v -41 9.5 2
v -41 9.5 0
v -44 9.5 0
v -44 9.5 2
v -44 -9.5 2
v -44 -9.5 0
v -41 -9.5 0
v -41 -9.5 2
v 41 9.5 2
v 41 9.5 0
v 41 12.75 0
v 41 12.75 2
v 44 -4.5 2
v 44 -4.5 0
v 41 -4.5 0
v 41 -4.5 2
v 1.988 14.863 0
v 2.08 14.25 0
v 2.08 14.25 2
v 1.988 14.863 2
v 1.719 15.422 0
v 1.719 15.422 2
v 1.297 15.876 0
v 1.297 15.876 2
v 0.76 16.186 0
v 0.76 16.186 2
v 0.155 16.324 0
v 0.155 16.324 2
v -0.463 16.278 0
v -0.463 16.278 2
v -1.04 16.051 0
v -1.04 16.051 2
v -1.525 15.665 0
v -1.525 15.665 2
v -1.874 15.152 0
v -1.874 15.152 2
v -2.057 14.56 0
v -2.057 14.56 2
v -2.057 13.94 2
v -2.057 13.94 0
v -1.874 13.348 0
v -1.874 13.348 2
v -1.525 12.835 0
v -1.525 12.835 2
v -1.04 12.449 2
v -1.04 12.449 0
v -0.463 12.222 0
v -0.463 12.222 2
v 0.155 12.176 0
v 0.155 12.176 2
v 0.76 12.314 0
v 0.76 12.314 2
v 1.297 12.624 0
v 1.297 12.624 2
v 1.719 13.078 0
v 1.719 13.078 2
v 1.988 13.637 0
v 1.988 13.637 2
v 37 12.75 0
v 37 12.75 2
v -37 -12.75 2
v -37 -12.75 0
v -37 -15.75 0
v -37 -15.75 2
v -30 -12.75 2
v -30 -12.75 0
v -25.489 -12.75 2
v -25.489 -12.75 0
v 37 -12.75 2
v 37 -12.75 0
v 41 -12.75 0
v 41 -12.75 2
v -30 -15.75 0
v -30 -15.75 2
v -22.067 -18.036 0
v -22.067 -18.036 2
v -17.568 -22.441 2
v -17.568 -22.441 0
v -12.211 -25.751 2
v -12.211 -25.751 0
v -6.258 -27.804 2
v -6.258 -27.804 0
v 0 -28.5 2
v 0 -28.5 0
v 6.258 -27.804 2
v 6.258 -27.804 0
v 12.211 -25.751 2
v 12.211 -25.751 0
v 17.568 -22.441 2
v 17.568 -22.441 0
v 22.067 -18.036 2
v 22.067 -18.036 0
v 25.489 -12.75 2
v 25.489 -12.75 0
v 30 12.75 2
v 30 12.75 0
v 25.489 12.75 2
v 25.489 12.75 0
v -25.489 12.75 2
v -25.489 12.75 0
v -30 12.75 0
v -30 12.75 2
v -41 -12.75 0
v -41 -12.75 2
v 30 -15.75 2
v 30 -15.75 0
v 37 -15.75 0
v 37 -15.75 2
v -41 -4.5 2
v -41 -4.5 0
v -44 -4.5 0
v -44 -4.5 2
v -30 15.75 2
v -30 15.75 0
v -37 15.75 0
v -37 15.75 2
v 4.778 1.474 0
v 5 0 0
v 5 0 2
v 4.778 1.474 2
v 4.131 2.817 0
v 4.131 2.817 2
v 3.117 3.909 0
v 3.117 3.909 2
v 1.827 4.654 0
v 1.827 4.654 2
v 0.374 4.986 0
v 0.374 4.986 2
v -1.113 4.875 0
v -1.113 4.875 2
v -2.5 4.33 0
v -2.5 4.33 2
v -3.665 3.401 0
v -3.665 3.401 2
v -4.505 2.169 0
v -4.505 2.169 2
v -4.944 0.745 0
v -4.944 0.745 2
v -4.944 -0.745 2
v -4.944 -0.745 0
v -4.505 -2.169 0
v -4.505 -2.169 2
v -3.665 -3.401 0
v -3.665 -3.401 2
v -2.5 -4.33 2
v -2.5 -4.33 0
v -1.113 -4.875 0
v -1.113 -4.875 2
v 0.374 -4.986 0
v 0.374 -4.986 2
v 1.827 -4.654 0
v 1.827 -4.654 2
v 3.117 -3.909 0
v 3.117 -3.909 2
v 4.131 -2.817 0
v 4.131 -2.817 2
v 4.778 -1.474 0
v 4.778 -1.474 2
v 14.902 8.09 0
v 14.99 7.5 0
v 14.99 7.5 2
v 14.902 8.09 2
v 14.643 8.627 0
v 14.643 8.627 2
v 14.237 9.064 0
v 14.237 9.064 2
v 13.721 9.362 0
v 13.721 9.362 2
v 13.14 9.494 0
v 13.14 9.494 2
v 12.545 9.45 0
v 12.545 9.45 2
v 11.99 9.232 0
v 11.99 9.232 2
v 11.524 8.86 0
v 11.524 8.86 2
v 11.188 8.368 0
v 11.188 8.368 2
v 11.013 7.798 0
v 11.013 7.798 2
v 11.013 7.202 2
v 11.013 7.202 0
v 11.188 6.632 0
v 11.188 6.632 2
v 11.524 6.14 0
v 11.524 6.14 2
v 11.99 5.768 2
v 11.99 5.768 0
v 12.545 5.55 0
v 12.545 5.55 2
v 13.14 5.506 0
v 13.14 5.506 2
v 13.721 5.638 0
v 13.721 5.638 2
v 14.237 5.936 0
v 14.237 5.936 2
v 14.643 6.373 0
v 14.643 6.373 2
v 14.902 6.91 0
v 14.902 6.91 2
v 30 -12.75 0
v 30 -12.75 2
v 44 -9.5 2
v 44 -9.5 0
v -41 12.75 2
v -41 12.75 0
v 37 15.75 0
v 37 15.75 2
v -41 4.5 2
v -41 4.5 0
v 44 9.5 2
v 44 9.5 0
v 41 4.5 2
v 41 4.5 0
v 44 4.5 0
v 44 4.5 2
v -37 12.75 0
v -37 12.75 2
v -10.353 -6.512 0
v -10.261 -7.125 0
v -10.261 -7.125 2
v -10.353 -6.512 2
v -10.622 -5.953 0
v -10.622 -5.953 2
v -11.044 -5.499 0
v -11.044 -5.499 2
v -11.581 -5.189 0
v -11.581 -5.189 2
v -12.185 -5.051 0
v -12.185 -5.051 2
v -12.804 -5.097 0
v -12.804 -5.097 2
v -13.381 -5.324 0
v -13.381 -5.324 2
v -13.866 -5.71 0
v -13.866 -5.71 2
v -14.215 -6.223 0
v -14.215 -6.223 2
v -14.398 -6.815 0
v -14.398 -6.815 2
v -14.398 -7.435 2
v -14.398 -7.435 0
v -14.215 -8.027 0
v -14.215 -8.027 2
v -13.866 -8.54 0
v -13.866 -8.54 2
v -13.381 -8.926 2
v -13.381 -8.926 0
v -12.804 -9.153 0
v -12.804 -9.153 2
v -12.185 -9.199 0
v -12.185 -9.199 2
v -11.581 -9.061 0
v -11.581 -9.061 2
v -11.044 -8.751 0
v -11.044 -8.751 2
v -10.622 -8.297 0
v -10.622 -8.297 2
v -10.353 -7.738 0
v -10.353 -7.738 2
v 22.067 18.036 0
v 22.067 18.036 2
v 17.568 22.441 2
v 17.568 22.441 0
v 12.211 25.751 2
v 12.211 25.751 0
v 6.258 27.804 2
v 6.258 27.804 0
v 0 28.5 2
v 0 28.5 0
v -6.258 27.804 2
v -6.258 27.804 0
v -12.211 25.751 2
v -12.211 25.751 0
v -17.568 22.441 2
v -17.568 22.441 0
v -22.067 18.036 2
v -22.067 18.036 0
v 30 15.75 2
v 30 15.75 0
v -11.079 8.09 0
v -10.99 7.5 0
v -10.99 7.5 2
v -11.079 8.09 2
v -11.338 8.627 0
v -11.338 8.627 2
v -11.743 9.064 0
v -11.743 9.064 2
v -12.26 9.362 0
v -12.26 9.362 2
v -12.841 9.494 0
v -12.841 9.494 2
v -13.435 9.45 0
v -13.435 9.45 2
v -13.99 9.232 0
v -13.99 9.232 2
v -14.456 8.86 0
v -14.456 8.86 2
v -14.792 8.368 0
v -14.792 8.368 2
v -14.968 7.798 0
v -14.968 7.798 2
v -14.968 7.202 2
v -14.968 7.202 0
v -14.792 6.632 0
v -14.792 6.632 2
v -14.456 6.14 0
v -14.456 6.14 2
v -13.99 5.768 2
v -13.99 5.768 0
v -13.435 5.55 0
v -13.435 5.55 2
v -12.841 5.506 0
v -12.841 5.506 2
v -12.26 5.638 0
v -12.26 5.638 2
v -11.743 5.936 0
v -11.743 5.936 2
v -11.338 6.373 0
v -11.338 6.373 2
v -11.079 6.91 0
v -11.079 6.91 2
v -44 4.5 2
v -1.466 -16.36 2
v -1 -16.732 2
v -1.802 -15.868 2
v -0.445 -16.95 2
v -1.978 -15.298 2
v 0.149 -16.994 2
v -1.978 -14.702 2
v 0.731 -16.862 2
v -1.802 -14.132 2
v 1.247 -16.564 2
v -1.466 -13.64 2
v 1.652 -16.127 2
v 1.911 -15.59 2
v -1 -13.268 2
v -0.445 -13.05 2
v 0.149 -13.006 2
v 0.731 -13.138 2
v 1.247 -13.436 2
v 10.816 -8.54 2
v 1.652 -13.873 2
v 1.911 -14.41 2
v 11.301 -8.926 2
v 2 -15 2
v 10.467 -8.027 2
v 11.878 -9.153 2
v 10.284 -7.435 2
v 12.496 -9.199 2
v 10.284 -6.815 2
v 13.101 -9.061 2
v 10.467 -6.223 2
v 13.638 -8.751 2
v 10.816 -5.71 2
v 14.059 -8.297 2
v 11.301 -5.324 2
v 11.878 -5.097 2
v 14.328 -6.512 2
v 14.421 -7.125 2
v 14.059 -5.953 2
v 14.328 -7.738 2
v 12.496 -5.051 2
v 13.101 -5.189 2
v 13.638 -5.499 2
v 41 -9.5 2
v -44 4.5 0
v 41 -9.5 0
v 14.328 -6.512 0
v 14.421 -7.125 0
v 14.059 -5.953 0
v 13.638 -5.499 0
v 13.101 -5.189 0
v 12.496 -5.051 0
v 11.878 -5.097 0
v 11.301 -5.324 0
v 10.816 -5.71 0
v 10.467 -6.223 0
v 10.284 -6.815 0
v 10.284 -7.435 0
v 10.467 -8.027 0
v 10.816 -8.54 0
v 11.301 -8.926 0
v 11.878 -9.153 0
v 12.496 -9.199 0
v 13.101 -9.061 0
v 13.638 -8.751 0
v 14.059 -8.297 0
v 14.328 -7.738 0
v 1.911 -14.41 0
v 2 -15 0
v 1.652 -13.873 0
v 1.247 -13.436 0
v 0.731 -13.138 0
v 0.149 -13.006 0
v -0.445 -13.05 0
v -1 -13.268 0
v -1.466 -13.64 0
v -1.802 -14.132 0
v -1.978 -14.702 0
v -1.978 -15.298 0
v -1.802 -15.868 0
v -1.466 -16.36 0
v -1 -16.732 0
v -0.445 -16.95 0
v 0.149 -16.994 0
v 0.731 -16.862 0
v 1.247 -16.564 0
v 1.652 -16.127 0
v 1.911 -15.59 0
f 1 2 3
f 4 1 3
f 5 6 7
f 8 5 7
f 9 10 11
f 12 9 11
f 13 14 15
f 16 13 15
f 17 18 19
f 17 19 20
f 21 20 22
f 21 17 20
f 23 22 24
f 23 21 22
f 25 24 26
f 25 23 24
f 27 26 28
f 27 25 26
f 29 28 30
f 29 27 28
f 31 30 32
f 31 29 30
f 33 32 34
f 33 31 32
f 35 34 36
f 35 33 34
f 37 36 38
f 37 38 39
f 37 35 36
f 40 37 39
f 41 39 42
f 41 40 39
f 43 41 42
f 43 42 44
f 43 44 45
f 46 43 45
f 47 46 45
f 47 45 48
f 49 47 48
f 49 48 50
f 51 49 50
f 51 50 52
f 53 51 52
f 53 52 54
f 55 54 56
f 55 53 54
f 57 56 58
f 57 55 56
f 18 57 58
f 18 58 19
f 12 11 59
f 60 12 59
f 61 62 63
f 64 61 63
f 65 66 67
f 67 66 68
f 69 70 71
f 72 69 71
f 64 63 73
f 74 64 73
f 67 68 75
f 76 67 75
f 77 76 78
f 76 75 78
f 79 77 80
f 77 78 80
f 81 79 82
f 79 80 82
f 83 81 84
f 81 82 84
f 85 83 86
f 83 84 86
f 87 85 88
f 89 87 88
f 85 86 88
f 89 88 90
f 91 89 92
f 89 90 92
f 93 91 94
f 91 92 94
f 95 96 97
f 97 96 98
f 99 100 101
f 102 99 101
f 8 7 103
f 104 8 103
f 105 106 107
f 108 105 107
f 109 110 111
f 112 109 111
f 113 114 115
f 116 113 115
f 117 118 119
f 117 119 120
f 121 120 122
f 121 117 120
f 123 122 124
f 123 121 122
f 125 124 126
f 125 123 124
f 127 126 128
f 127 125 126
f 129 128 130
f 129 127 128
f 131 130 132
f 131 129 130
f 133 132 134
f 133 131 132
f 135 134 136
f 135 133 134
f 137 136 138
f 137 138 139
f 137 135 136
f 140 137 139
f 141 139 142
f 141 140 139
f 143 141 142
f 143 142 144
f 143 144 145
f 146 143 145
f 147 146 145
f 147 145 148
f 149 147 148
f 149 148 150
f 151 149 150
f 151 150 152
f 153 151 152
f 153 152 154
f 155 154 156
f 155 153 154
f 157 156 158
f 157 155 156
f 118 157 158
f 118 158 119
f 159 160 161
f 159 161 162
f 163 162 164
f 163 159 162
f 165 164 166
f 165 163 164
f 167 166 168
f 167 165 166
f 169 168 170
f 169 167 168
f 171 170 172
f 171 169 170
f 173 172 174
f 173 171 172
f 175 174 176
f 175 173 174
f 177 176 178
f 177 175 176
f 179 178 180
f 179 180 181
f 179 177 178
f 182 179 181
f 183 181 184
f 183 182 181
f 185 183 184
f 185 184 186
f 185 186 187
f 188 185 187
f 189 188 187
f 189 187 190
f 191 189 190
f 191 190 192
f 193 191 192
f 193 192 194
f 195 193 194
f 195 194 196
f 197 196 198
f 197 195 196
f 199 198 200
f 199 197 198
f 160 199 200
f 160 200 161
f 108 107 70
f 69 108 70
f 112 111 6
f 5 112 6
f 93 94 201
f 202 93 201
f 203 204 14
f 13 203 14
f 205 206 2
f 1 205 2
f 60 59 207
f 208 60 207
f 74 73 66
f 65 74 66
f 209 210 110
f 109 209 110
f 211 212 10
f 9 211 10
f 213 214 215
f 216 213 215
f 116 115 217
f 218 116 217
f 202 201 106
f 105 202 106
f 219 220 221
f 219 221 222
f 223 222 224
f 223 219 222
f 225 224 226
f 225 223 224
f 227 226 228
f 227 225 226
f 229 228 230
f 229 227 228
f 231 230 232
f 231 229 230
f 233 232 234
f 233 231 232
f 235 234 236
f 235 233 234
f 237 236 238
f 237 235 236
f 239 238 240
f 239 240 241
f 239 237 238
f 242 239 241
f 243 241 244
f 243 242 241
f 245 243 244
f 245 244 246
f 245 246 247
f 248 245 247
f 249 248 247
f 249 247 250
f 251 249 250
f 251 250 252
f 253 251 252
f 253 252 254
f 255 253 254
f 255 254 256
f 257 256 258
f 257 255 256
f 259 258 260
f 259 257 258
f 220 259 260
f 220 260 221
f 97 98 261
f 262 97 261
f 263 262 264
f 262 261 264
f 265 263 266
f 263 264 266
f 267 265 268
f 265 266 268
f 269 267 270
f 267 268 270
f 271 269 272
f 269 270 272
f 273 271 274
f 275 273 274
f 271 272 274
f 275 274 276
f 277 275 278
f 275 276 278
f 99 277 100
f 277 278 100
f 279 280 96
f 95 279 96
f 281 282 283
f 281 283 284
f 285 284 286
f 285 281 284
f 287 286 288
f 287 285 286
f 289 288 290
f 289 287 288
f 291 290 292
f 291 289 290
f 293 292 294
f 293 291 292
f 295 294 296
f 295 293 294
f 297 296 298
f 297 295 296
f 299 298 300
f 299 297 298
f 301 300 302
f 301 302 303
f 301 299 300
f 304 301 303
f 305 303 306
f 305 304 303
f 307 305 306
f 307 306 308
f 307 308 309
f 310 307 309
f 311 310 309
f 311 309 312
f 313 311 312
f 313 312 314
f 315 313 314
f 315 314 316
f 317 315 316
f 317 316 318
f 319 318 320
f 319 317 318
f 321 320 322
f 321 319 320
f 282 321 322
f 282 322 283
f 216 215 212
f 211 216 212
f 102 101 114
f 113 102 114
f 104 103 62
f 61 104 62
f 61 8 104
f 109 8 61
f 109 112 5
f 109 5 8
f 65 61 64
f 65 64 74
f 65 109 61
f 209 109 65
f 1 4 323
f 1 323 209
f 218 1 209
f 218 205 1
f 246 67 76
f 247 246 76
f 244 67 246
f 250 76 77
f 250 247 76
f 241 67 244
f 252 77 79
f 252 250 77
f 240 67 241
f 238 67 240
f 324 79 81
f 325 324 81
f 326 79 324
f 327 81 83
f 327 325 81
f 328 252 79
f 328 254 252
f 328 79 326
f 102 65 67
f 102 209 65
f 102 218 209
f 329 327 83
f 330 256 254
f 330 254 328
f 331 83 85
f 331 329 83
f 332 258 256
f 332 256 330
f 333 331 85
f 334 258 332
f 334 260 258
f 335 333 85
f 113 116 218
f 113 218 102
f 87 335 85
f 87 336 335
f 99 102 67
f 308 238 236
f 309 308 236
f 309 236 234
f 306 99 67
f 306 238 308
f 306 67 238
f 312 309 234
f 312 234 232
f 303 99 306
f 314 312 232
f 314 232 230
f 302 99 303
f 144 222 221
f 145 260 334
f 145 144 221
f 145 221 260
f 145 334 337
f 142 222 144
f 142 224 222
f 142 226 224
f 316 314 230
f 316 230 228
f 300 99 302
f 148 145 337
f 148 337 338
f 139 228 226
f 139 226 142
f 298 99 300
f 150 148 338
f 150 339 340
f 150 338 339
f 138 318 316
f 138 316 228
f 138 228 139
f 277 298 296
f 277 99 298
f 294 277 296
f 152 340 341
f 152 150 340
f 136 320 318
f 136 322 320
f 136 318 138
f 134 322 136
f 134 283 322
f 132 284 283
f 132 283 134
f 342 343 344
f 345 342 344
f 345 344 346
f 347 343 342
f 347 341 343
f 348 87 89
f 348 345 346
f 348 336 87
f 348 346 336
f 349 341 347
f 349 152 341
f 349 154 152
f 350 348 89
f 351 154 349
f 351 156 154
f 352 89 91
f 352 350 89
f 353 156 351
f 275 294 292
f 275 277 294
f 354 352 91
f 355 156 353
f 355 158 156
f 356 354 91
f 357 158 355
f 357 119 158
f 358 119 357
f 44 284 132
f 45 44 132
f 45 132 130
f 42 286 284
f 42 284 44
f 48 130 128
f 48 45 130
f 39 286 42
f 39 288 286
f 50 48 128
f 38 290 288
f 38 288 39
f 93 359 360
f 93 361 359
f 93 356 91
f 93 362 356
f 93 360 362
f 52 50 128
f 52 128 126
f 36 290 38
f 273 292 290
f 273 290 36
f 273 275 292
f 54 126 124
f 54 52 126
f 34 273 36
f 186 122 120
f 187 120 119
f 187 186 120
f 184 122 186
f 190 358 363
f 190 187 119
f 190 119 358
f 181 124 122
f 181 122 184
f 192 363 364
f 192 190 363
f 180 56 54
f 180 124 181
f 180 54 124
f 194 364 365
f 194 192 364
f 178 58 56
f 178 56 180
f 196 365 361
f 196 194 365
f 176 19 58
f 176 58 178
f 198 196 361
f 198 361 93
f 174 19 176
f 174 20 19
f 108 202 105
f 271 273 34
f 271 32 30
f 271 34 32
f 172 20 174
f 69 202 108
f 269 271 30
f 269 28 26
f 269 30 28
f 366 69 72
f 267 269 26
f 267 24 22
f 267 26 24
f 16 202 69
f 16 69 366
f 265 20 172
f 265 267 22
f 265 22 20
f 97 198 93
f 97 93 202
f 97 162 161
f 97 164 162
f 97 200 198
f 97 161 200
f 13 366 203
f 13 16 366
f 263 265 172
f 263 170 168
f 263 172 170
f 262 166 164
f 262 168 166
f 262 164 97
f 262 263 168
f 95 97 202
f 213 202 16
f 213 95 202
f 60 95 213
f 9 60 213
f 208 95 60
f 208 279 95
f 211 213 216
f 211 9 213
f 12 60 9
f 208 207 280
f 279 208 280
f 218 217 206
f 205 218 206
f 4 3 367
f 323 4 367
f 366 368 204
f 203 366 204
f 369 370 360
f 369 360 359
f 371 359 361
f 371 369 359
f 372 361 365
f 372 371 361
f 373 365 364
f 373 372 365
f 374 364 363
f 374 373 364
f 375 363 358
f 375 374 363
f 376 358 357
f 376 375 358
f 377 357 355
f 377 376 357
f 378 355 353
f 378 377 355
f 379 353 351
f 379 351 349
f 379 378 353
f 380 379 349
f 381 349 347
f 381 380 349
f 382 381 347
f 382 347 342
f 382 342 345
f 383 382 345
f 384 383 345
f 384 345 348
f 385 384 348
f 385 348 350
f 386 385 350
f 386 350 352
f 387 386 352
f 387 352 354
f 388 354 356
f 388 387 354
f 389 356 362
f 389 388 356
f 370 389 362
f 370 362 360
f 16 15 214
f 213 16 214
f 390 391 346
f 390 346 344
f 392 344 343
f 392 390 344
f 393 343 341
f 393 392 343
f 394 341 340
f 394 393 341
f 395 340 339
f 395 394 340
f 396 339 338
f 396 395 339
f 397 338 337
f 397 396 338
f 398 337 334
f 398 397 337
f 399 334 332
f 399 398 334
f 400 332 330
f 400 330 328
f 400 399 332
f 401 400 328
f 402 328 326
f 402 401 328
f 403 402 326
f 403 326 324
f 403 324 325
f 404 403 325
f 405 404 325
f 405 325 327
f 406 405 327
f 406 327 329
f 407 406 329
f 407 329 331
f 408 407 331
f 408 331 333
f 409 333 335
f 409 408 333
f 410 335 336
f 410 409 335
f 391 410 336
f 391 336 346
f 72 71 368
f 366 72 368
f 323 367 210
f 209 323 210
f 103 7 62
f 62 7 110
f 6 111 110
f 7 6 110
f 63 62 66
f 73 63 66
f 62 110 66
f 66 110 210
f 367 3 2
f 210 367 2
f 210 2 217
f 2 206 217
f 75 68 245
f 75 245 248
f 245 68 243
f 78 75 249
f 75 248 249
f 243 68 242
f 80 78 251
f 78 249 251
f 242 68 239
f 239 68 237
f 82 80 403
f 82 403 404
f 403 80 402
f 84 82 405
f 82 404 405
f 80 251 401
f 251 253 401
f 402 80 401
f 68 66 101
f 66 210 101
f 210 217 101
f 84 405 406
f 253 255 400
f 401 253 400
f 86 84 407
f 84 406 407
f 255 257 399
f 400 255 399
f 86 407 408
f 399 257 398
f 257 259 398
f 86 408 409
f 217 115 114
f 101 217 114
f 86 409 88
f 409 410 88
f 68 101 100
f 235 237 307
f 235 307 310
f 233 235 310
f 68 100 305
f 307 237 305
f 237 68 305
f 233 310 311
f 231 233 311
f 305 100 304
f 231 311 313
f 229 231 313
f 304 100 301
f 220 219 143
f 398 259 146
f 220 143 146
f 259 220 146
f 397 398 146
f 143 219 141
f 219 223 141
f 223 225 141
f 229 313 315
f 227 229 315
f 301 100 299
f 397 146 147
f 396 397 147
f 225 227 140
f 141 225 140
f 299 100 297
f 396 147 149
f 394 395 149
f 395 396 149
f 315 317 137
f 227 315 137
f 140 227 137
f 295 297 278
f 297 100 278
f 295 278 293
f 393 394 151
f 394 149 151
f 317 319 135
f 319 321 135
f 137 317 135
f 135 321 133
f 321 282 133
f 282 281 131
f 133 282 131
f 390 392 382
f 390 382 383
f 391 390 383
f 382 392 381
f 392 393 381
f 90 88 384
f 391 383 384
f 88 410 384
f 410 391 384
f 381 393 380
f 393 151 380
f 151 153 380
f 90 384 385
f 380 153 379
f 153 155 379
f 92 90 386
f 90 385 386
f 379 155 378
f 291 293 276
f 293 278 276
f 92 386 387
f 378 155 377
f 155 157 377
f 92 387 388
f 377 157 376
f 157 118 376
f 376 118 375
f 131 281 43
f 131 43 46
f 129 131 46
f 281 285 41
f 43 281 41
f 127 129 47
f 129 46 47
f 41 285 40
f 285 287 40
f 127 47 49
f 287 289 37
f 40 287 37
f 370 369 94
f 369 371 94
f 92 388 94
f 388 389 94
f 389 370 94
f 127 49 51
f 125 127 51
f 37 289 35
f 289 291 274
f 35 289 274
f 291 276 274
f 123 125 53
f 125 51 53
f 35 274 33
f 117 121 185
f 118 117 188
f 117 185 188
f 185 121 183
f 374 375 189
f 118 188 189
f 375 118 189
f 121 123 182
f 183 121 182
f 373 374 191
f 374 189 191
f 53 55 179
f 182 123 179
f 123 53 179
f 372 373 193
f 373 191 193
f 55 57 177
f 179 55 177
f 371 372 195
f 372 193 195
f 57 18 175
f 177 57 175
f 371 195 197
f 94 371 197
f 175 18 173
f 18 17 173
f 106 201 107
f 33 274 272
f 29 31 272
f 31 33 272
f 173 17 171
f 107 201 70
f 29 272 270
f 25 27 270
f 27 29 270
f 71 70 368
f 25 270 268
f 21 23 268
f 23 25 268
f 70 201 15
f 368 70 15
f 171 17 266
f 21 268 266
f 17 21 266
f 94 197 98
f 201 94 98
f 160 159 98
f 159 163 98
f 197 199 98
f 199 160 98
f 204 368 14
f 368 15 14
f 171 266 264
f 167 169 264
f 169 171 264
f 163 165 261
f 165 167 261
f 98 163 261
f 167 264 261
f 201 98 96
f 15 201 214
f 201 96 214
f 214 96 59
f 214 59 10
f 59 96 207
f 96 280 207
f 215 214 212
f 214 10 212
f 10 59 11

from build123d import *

# Parameters (mm, degrees)
SKETCH_1_R      = 2
SKETCH_1_R_2    = 2.08
SKETCH_1_R_3    = 5
EXTRUDE_2_DEPTH = 2


with BuildPart() as part:
    # 草图1 → 凸台-拉伸2 (new body)
    with BuildSketch(Plane.XY):
        with BuildLine():
            Line((-41, -12.75), (-37, -12.75))
            Line((-37, -12.75), (-37, -15.75))
            Line((-37, -15.75), (-30, -15.75))
            Line((-30, -15.75), (-30, -12.75))
            Line((-30, -12.75), (-25.488968202, -12.75))
            ThreePointArc((-25.488968202, -12.75), (0, -28.5), (25.488968202, -12.75))
            Line((25.488968202, -12.75), (30, -12.75))
            Line((30, -12.75), (30, -15.75))
            Line((30, -15.75), (37, -15.75))
            Line((37, -15.75), (37, -12.75))
            Line((37, -12.75), (41, -12.75))
            Line((41, -12.75), (41, -9.5))
            Line((41, -9.5), (44, -9.5))
            Line((44, -9.5), (44, -4.5))
            Line((44, -4.5), (41, -4.5))
            Line((41, -4.5), (41, 4.5))
            Line((41, 4.5), (44, 4.5))
            Line((44, 4.5), (44, 9.5))
            Line((44, 9.5), (41, 9.5))
            Line((41, 9.5), (41, 12.75))
            Line((41, 12.75), (37, 12.75))
            Line((37, 12.75), (37, 15.75))
            Line((37, 15.75), (30, 15.75))
            Line((30, 15.75), (30, 12.75))
            Line((30, 12.75), (25.488968202, 12.75))
            ThreePointArc((25.488968202, 12.75), (0, 28.5), (-25.488968202, 12.75))
            Line((-25.488968202, 12.75), (-30, 12.75))
            Line((-30, 12.75), (-30, 15.75))
            Line((-30, 15.75), (-37, 15.75))
            Line((-37, 15.75), (-37, 12.75))
            Line((-37, 12.75), (-41, 12.75))
            Line((-41, 12.75), (-41, 9.5))
            Line((-41, 9.5), (-44, 9.5))
            Line((-44, 9.5), (-44, 4.5))
            Line((-44, 4.5), (-41, 4.5))
            Line((-41, 4.5), (-41, -4.5))
            Line((-41, -4.5), (-44, -4.5))
            Line((-44, -4.5), (-44, -9.5))
            Line((-44, -9.5), (-41, -9.5))
            Line((-41, -9.5), (-41, -12.75))
        make_face()
        with Locations((12.990381057, 7.5)):
            Circle(SKETCH_1_R, mode=Mode.SUBTRACT)
        with Locations((0, 14.25)):
            Circle(SKETCH_1_R_2, mode=Mode.SUBTRACT)
        with Locations((-12.990381057, 7.5)):
            Circle(SKETCH_1_R, mode=Mode.SUBTRACT)
        with Locations((-12.340862004, -7.125)):
            Circle(SKETCH_1_R_2, mode=Mode.SUBTRACT)
        with Locations((0, -15)):
            Circle(SKETCH_1_R, mode=Mode.SUBTRACT)
        with Locations((12.340862004, -7.125)):
            Circle(SKETCH_1_R_2, mode=Mode.SUBTRACT)
        Circle(SKETCH_1_R_3, mode=Mode.SUBTRACT)
    extrude(amount=EXTRUDE_2_DEPTH)


solid = part.part
